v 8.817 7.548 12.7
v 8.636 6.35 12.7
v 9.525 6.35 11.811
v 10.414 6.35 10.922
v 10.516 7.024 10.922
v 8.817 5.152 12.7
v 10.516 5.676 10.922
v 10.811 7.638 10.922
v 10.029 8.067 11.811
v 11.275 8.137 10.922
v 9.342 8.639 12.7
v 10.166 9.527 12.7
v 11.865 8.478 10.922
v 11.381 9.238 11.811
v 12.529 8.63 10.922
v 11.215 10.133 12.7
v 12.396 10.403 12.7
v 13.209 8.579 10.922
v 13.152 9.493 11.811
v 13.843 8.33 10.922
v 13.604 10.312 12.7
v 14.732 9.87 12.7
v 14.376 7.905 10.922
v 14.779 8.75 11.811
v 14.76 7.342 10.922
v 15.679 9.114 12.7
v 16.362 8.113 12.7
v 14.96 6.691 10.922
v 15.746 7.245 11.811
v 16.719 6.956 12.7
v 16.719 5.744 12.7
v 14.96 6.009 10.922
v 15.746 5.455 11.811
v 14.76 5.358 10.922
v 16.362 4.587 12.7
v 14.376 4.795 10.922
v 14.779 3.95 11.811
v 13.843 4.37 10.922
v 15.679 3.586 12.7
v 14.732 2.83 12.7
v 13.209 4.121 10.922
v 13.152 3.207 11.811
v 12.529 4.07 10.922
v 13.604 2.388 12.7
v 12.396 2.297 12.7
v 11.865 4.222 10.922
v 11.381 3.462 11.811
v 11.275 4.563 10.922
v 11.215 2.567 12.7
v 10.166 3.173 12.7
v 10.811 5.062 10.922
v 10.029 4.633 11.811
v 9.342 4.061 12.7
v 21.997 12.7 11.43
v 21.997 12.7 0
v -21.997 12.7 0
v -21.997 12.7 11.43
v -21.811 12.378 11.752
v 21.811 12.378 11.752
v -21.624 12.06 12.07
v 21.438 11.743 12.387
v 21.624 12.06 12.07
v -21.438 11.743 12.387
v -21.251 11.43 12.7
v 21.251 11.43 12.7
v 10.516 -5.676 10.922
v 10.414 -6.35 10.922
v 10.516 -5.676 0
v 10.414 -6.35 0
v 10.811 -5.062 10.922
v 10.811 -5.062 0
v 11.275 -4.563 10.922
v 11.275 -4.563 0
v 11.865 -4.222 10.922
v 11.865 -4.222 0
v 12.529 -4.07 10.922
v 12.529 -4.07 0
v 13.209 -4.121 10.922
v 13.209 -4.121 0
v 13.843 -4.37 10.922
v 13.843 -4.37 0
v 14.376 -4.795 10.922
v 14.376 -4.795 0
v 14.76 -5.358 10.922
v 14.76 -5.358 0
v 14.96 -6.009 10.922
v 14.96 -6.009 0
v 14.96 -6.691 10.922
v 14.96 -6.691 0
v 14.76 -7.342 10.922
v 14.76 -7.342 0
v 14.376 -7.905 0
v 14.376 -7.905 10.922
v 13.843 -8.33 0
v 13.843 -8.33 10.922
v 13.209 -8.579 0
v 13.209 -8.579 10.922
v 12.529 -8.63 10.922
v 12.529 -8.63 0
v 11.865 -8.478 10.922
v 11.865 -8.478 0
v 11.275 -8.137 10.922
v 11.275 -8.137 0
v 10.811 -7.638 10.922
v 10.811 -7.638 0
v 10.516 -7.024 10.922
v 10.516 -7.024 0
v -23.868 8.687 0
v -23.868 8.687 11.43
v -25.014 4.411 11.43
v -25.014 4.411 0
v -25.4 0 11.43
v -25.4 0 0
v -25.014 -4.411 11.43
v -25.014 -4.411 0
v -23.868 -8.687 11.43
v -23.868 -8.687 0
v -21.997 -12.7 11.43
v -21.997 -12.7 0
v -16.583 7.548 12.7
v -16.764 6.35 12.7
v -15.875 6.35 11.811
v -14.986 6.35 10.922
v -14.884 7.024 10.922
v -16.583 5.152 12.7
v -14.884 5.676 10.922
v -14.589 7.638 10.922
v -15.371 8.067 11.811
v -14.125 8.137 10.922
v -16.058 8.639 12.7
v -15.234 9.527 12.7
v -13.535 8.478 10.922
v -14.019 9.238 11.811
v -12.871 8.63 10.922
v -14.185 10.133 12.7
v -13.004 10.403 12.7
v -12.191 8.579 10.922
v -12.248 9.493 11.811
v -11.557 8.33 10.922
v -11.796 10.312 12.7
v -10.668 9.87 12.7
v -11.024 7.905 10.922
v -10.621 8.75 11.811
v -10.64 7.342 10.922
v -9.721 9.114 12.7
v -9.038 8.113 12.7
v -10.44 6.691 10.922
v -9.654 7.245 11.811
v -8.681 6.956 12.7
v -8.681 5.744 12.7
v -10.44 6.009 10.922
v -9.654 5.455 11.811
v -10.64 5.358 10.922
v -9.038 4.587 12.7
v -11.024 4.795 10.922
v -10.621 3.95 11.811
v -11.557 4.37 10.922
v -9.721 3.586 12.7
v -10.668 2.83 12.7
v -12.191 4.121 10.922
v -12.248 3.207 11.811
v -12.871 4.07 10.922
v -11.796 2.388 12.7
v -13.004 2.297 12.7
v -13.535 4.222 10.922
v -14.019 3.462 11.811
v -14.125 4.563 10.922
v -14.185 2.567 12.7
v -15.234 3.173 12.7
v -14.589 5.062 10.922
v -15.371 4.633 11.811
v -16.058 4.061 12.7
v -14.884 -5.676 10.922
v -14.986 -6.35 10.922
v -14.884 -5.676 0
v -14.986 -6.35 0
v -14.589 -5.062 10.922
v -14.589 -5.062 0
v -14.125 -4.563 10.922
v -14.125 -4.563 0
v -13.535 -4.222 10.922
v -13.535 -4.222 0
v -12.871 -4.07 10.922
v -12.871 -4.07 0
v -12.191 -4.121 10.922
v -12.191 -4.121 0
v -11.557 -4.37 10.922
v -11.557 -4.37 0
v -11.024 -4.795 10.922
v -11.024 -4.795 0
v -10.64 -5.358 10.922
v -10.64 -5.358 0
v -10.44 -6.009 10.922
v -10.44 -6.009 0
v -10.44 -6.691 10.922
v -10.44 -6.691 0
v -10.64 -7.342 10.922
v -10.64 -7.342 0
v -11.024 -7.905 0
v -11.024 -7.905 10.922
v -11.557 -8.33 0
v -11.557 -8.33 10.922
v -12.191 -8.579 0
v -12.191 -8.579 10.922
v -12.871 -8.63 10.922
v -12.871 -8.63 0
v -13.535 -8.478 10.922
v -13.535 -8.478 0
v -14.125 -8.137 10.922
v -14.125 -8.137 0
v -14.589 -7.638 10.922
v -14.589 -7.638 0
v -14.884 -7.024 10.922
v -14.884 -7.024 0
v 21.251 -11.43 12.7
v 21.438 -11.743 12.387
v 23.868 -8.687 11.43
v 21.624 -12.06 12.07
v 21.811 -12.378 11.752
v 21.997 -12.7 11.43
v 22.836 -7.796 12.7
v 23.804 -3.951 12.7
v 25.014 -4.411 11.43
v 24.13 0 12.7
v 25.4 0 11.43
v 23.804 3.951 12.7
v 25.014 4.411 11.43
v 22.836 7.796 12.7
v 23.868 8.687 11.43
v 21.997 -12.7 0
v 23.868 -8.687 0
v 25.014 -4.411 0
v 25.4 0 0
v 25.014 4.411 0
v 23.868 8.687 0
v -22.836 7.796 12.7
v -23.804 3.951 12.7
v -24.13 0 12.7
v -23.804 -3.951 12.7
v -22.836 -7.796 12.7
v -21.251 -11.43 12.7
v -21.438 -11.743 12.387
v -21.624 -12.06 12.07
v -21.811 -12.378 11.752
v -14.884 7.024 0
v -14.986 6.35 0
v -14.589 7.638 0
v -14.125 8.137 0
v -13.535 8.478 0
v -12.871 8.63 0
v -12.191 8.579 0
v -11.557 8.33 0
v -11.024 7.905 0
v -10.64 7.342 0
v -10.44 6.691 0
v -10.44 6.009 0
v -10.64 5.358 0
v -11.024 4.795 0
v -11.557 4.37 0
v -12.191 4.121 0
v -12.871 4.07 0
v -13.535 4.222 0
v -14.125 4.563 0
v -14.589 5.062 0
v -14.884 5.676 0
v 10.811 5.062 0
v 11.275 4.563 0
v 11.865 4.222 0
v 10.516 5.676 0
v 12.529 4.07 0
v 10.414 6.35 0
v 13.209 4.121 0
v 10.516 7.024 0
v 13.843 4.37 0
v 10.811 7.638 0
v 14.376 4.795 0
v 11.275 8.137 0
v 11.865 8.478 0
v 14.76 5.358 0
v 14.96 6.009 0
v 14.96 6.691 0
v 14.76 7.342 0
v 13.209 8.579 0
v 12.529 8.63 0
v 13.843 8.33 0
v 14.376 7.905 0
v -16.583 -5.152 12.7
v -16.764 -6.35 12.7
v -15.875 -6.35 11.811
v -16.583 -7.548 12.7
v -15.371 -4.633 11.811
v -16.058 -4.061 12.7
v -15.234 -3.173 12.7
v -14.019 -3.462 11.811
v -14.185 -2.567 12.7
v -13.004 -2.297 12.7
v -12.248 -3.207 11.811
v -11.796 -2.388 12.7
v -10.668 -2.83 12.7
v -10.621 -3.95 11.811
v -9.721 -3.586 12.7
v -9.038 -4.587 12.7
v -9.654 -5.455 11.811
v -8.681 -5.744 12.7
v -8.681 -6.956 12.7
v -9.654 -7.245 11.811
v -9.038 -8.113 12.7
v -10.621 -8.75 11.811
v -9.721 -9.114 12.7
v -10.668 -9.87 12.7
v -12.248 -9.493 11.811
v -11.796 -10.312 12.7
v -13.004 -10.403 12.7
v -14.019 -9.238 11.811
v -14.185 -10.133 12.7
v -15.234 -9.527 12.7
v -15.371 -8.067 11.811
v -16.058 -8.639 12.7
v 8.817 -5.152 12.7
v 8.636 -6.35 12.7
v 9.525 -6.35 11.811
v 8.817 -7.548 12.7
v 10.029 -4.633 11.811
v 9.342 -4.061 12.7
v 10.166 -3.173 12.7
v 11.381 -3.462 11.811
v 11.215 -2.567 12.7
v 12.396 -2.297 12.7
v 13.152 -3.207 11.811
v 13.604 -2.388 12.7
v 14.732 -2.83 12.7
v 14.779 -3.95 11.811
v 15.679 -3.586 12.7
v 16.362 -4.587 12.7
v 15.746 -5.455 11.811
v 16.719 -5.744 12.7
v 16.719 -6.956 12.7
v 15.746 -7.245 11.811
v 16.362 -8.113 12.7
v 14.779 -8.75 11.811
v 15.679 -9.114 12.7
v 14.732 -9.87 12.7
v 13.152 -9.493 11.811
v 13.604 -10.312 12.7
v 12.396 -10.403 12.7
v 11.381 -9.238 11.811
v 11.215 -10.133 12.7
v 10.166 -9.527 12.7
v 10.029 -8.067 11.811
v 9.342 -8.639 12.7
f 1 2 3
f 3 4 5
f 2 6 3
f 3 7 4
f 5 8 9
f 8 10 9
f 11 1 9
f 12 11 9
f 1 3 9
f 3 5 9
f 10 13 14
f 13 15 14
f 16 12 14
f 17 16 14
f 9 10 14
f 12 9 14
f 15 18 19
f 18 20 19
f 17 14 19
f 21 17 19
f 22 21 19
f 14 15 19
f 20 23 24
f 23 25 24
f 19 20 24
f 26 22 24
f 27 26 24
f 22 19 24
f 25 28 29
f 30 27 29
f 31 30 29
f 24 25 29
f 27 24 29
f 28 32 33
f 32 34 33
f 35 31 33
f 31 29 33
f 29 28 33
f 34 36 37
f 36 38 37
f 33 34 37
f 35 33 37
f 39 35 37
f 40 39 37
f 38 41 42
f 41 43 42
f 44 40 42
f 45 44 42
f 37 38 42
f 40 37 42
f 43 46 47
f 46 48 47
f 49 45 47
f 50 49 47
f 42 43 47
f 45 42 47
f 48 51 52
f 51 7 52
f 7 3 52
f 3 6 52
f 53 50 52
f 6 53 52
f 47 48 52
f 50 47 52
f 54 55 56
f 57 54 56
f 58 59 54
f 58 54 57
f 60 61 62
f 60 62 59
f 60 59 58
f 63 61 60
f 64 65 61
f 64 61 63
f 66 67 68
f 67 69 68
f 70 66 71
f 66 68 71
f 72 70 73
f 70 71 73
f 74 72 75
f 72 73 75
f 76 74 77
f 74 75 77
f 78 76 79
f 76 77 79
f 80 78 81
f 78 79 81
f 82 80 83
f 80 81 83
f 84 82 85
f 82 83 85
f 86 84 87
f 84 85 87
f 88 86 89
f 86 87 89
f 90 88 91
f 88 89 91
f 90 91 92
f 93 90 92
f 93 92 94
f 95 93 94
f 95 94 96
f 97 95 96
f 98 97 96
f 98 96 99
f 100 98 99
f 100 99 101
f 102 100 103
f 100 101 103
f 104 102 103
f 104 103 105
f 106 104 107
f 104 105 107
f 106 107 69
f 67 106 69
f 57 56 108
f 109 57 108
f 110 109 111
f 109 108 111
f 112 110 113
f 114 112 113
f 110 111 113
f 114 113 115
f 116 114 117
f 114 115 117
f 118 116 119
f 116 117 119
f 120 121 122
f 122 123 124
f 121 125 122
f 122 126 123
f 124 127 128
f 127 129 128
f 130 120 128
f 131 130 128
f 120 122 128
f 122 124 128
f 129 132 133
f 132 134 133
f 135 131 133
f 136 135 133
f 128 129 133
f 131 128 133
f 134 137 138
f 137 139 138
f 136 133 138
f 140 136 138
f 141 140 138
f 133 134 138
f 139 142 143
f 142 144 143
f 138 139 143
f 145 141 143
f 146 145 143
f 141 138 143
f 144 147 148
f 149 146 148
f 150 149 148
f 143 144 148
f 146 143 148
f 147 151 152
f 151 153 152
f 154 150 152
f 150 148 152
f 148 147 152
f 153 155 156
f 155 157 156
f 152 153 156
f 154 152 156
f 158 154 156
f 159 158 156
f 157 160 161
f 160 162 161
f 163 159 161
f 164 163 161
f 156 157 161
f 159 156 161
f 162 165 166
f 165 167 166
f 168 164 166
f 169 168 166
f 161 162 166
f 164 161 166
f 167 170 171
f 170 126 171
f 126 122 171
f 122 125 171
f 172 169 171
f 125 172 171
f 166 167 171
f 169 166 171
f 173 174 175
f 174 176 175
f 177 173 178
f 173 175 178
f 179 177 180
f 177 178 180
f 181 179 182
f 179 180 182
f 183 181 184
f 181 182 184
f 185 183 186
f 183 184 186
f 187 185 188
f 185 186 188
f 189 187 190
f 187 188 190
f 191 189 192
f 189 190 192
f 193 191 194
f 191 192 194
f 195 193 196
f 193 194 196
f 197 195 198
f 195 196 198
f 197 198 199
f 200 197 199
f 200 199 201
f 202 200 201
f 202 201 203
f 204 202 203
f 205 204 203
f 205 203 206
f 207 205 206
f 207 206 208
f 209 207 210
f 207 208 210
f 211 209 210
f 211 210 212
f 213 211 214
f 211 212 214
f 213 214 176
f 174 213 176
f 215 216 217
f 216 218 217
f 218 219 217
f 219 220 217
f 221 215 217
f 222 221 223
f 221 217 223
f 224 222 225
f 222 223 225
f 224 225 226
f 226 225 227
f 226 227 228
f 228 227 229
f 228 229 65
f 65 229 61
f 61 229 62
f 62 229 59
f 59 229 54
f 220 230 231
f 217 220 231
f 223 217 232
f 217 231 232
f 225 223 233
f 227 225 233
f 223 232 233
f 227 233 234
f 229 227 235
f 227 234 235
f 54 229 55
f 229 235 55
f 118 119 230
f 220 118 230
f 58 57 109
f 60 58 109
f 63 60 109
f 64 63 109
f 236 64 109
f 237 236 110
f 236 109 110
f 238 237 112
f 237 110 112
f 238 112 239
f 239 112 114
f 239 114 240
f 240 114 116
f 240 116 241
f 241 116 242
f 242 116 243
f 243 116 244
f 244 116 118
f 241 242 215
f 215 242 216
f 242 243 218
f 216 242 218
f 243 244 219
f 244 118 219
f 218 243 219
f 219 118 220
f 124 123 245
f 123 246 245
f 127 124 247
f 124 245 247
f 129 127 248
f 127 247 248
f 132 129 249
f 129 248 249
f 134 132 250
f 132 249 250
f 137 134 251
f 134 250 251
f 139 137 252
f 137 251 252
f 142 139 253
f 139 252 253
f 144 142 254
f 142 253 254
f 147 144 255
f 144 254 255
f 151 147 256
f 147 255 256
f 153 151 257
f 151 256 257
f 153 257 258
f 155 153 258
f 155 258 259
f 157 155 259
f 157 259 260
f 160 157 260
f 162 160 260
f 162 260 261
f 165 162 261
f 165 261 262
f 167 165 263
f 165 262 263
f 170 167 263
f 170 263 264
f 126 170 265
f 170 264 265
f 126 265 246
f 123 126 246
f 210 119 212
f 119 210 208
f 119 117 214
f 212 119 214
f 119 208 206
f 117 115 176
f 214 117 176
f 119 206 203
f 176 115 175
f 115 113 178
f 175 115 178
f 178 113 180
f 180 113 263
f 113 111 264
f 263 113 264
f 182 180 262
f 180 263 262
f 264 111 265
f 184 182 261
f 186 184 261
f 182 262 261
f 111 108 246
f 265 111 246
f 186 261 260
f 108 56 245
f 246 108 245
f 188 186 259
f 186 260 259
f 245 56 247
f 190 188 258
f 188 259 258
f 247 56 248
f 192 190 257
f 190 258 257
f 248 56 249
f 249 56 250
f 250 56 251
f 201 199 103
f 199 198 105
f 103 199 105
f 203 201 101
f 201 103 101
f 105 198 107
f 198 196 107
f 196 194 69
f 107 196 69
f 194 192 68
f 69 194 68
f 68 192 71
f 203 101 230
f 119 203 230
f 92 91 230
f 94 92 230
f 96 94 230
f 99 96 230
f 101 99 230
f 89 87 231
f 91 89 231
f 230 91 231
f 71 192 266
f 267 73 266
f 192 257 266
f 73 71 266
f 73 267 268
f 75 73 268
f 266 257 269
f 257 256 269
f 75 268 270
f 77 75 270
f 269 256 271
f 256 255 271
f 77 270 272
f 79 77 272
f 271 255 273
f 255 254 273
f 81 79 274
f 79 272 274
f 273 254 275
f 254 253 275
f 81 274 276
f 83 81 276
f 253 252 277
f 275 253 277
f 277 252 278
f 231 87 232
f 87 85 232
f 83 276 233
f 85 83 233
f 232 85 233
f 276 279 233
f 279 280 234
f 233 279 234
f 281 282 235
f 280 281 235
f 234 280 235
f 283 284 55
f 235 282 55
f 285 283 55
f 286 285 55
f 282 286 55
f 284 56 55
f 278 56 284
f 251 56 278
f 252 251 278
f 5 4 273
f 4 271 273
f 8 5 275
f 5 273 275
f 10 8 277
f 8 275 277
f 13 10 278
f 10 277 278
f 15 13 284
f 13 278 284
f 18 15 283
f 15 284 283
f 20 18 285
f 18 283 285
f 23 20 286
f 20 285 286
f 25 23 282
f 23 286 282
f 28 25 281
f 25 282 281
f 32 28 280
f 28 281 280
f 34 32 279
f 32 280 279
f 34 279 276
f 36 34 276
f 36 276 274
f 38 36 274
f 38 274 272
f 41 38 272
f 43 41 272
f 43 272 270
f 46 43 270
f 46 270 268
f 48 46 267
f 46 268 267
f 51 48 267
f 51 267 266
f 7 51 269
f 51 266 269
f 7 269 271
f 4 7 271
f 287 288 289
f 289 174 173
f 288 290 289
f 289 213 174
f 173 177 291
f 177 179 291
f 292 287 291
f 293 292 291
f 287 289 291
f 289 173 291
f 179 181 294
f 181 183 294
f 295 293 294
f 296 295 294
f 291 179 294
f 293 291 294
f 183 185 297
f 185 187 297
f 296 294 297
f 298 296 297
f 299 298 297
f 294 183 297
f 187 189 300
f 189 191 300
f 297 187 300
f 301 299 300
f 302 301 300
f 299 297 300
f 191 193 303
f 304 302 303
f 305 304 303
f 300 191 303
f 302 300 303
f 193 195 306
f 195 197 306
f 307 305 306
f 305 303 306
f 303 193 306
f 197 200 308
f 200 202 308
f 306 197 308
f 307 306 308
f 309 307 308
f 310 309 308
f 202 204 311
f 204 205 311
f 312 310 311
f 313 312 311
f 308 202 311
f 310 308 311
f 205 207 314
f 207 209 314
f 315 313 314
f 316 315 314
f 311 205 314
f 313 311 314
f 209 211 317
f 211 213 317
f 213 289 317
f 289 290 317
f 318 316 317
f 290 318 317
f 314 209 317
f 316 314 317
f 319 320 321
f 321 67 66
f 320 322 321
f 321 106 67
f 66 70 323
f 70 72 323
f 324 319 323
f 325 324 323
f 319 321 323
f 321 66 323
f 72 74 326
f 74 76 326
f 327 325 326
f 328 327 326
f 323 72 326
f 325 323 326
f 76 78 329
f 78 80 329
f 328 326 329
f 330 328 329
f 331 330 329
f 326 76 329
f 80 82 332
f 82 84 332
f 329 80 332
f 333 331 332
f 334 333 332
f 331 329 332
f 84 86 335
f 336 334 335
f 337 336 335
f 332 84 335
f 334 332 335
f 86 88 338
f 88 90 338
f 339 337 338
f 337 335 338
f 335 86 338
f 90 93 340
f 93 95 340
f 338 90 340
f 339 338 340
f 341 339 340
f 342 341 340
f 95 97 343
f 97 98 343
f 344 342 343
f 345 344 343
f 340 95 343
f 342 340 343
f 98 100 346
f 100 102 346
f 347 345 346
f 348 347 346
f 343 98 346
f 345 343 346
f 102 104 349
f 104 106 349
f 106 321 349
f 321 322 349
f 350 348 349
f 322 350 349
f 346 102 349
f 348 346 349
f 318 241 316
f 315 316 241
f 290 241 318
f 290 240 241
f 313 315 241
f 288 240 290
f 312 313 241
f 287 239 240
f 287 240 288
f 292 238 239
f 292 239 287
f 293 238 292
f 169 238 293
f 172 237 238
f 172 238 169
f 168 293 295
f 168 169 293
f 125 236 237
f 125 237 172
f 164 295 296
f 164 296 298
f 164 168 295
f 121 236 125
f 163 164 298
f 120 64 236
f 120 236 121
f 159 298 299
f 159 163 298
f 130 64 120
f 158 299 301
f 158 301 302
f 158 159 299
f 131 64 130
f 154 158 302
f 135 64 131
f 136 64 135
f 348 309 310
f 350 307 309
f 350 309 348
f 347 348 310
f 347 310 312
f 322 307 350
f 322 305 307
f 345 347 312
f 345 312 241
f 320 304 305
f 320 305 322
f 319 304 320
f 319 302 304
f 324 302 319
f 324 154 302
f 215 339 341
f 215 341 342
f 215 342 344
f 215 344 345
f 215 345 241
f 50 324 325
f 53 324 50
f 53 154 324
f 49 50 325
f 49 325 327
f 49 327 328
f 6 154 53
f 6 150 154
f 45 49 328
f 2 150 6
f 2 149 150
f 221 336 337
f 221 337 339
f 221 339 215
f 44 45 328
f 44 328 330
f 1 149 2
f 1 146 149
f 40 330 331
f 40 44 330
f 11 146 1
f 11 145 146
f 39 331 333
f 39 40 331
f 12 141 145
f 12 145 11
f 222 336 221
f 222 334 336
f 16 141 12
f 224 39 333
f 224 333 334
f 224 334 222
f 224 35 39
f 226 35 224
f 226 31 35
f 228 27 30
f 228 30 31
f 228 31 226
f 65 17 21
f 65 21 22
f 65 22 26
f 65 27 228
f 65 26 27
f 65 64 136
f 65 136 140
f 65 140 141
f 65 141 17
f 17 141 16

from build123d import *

# Parameters (mm, degrees)
F1_DEPTH       = 12.7
F3_D           = 4.572
F3_CSINK_D     = 8.128
F3_CSINK_ANGLE = 90
F4_SIZE        = 1.27


with BuildPart() as f1:
    # F0 (on Top) → F1 (new body)
    with BuildSketch(Plane.XY):
        with BuildLine():
            Line((21.997045, 12.7), (-21.997045, 12.7))
            ThreePointArc((-21.997045, 12.7), (-25.4, 0), (-21.997045, -12.7))
            Line((-21.997045, -12.7), (21.997045, -12.7))
            ThreePointArc((21.997045, -12.7), (25.4, 0), (21.997045, 12.7))
        make_face()
    extrude(amount=F1_DEPTH)

    # F3 (through all)
    with Locations(Plane.XY.offset(12.7)):
        with Locations((-12.7, 6.35), (-12.7, -6.35), (12.7, -6.35), (12.7, 6.35)):
            CounterSinkHole(F3_D / 2, F3_CSINK_D / 2, counter_sink_angle=F3_CSINK_ANGLE)

    # F4
    f4_edges = [f1.edges().sort_by_distance(p)[0] for p in [
        (0, -12.7, 12.7),
        (25.4, 0, 12.7),
        (0, 12.7, 12.7),
        (-25.4, 0, 12.7),
    ]]
    chamfer(f4_edges, length=F4_SIZE)


solid = f1.part
